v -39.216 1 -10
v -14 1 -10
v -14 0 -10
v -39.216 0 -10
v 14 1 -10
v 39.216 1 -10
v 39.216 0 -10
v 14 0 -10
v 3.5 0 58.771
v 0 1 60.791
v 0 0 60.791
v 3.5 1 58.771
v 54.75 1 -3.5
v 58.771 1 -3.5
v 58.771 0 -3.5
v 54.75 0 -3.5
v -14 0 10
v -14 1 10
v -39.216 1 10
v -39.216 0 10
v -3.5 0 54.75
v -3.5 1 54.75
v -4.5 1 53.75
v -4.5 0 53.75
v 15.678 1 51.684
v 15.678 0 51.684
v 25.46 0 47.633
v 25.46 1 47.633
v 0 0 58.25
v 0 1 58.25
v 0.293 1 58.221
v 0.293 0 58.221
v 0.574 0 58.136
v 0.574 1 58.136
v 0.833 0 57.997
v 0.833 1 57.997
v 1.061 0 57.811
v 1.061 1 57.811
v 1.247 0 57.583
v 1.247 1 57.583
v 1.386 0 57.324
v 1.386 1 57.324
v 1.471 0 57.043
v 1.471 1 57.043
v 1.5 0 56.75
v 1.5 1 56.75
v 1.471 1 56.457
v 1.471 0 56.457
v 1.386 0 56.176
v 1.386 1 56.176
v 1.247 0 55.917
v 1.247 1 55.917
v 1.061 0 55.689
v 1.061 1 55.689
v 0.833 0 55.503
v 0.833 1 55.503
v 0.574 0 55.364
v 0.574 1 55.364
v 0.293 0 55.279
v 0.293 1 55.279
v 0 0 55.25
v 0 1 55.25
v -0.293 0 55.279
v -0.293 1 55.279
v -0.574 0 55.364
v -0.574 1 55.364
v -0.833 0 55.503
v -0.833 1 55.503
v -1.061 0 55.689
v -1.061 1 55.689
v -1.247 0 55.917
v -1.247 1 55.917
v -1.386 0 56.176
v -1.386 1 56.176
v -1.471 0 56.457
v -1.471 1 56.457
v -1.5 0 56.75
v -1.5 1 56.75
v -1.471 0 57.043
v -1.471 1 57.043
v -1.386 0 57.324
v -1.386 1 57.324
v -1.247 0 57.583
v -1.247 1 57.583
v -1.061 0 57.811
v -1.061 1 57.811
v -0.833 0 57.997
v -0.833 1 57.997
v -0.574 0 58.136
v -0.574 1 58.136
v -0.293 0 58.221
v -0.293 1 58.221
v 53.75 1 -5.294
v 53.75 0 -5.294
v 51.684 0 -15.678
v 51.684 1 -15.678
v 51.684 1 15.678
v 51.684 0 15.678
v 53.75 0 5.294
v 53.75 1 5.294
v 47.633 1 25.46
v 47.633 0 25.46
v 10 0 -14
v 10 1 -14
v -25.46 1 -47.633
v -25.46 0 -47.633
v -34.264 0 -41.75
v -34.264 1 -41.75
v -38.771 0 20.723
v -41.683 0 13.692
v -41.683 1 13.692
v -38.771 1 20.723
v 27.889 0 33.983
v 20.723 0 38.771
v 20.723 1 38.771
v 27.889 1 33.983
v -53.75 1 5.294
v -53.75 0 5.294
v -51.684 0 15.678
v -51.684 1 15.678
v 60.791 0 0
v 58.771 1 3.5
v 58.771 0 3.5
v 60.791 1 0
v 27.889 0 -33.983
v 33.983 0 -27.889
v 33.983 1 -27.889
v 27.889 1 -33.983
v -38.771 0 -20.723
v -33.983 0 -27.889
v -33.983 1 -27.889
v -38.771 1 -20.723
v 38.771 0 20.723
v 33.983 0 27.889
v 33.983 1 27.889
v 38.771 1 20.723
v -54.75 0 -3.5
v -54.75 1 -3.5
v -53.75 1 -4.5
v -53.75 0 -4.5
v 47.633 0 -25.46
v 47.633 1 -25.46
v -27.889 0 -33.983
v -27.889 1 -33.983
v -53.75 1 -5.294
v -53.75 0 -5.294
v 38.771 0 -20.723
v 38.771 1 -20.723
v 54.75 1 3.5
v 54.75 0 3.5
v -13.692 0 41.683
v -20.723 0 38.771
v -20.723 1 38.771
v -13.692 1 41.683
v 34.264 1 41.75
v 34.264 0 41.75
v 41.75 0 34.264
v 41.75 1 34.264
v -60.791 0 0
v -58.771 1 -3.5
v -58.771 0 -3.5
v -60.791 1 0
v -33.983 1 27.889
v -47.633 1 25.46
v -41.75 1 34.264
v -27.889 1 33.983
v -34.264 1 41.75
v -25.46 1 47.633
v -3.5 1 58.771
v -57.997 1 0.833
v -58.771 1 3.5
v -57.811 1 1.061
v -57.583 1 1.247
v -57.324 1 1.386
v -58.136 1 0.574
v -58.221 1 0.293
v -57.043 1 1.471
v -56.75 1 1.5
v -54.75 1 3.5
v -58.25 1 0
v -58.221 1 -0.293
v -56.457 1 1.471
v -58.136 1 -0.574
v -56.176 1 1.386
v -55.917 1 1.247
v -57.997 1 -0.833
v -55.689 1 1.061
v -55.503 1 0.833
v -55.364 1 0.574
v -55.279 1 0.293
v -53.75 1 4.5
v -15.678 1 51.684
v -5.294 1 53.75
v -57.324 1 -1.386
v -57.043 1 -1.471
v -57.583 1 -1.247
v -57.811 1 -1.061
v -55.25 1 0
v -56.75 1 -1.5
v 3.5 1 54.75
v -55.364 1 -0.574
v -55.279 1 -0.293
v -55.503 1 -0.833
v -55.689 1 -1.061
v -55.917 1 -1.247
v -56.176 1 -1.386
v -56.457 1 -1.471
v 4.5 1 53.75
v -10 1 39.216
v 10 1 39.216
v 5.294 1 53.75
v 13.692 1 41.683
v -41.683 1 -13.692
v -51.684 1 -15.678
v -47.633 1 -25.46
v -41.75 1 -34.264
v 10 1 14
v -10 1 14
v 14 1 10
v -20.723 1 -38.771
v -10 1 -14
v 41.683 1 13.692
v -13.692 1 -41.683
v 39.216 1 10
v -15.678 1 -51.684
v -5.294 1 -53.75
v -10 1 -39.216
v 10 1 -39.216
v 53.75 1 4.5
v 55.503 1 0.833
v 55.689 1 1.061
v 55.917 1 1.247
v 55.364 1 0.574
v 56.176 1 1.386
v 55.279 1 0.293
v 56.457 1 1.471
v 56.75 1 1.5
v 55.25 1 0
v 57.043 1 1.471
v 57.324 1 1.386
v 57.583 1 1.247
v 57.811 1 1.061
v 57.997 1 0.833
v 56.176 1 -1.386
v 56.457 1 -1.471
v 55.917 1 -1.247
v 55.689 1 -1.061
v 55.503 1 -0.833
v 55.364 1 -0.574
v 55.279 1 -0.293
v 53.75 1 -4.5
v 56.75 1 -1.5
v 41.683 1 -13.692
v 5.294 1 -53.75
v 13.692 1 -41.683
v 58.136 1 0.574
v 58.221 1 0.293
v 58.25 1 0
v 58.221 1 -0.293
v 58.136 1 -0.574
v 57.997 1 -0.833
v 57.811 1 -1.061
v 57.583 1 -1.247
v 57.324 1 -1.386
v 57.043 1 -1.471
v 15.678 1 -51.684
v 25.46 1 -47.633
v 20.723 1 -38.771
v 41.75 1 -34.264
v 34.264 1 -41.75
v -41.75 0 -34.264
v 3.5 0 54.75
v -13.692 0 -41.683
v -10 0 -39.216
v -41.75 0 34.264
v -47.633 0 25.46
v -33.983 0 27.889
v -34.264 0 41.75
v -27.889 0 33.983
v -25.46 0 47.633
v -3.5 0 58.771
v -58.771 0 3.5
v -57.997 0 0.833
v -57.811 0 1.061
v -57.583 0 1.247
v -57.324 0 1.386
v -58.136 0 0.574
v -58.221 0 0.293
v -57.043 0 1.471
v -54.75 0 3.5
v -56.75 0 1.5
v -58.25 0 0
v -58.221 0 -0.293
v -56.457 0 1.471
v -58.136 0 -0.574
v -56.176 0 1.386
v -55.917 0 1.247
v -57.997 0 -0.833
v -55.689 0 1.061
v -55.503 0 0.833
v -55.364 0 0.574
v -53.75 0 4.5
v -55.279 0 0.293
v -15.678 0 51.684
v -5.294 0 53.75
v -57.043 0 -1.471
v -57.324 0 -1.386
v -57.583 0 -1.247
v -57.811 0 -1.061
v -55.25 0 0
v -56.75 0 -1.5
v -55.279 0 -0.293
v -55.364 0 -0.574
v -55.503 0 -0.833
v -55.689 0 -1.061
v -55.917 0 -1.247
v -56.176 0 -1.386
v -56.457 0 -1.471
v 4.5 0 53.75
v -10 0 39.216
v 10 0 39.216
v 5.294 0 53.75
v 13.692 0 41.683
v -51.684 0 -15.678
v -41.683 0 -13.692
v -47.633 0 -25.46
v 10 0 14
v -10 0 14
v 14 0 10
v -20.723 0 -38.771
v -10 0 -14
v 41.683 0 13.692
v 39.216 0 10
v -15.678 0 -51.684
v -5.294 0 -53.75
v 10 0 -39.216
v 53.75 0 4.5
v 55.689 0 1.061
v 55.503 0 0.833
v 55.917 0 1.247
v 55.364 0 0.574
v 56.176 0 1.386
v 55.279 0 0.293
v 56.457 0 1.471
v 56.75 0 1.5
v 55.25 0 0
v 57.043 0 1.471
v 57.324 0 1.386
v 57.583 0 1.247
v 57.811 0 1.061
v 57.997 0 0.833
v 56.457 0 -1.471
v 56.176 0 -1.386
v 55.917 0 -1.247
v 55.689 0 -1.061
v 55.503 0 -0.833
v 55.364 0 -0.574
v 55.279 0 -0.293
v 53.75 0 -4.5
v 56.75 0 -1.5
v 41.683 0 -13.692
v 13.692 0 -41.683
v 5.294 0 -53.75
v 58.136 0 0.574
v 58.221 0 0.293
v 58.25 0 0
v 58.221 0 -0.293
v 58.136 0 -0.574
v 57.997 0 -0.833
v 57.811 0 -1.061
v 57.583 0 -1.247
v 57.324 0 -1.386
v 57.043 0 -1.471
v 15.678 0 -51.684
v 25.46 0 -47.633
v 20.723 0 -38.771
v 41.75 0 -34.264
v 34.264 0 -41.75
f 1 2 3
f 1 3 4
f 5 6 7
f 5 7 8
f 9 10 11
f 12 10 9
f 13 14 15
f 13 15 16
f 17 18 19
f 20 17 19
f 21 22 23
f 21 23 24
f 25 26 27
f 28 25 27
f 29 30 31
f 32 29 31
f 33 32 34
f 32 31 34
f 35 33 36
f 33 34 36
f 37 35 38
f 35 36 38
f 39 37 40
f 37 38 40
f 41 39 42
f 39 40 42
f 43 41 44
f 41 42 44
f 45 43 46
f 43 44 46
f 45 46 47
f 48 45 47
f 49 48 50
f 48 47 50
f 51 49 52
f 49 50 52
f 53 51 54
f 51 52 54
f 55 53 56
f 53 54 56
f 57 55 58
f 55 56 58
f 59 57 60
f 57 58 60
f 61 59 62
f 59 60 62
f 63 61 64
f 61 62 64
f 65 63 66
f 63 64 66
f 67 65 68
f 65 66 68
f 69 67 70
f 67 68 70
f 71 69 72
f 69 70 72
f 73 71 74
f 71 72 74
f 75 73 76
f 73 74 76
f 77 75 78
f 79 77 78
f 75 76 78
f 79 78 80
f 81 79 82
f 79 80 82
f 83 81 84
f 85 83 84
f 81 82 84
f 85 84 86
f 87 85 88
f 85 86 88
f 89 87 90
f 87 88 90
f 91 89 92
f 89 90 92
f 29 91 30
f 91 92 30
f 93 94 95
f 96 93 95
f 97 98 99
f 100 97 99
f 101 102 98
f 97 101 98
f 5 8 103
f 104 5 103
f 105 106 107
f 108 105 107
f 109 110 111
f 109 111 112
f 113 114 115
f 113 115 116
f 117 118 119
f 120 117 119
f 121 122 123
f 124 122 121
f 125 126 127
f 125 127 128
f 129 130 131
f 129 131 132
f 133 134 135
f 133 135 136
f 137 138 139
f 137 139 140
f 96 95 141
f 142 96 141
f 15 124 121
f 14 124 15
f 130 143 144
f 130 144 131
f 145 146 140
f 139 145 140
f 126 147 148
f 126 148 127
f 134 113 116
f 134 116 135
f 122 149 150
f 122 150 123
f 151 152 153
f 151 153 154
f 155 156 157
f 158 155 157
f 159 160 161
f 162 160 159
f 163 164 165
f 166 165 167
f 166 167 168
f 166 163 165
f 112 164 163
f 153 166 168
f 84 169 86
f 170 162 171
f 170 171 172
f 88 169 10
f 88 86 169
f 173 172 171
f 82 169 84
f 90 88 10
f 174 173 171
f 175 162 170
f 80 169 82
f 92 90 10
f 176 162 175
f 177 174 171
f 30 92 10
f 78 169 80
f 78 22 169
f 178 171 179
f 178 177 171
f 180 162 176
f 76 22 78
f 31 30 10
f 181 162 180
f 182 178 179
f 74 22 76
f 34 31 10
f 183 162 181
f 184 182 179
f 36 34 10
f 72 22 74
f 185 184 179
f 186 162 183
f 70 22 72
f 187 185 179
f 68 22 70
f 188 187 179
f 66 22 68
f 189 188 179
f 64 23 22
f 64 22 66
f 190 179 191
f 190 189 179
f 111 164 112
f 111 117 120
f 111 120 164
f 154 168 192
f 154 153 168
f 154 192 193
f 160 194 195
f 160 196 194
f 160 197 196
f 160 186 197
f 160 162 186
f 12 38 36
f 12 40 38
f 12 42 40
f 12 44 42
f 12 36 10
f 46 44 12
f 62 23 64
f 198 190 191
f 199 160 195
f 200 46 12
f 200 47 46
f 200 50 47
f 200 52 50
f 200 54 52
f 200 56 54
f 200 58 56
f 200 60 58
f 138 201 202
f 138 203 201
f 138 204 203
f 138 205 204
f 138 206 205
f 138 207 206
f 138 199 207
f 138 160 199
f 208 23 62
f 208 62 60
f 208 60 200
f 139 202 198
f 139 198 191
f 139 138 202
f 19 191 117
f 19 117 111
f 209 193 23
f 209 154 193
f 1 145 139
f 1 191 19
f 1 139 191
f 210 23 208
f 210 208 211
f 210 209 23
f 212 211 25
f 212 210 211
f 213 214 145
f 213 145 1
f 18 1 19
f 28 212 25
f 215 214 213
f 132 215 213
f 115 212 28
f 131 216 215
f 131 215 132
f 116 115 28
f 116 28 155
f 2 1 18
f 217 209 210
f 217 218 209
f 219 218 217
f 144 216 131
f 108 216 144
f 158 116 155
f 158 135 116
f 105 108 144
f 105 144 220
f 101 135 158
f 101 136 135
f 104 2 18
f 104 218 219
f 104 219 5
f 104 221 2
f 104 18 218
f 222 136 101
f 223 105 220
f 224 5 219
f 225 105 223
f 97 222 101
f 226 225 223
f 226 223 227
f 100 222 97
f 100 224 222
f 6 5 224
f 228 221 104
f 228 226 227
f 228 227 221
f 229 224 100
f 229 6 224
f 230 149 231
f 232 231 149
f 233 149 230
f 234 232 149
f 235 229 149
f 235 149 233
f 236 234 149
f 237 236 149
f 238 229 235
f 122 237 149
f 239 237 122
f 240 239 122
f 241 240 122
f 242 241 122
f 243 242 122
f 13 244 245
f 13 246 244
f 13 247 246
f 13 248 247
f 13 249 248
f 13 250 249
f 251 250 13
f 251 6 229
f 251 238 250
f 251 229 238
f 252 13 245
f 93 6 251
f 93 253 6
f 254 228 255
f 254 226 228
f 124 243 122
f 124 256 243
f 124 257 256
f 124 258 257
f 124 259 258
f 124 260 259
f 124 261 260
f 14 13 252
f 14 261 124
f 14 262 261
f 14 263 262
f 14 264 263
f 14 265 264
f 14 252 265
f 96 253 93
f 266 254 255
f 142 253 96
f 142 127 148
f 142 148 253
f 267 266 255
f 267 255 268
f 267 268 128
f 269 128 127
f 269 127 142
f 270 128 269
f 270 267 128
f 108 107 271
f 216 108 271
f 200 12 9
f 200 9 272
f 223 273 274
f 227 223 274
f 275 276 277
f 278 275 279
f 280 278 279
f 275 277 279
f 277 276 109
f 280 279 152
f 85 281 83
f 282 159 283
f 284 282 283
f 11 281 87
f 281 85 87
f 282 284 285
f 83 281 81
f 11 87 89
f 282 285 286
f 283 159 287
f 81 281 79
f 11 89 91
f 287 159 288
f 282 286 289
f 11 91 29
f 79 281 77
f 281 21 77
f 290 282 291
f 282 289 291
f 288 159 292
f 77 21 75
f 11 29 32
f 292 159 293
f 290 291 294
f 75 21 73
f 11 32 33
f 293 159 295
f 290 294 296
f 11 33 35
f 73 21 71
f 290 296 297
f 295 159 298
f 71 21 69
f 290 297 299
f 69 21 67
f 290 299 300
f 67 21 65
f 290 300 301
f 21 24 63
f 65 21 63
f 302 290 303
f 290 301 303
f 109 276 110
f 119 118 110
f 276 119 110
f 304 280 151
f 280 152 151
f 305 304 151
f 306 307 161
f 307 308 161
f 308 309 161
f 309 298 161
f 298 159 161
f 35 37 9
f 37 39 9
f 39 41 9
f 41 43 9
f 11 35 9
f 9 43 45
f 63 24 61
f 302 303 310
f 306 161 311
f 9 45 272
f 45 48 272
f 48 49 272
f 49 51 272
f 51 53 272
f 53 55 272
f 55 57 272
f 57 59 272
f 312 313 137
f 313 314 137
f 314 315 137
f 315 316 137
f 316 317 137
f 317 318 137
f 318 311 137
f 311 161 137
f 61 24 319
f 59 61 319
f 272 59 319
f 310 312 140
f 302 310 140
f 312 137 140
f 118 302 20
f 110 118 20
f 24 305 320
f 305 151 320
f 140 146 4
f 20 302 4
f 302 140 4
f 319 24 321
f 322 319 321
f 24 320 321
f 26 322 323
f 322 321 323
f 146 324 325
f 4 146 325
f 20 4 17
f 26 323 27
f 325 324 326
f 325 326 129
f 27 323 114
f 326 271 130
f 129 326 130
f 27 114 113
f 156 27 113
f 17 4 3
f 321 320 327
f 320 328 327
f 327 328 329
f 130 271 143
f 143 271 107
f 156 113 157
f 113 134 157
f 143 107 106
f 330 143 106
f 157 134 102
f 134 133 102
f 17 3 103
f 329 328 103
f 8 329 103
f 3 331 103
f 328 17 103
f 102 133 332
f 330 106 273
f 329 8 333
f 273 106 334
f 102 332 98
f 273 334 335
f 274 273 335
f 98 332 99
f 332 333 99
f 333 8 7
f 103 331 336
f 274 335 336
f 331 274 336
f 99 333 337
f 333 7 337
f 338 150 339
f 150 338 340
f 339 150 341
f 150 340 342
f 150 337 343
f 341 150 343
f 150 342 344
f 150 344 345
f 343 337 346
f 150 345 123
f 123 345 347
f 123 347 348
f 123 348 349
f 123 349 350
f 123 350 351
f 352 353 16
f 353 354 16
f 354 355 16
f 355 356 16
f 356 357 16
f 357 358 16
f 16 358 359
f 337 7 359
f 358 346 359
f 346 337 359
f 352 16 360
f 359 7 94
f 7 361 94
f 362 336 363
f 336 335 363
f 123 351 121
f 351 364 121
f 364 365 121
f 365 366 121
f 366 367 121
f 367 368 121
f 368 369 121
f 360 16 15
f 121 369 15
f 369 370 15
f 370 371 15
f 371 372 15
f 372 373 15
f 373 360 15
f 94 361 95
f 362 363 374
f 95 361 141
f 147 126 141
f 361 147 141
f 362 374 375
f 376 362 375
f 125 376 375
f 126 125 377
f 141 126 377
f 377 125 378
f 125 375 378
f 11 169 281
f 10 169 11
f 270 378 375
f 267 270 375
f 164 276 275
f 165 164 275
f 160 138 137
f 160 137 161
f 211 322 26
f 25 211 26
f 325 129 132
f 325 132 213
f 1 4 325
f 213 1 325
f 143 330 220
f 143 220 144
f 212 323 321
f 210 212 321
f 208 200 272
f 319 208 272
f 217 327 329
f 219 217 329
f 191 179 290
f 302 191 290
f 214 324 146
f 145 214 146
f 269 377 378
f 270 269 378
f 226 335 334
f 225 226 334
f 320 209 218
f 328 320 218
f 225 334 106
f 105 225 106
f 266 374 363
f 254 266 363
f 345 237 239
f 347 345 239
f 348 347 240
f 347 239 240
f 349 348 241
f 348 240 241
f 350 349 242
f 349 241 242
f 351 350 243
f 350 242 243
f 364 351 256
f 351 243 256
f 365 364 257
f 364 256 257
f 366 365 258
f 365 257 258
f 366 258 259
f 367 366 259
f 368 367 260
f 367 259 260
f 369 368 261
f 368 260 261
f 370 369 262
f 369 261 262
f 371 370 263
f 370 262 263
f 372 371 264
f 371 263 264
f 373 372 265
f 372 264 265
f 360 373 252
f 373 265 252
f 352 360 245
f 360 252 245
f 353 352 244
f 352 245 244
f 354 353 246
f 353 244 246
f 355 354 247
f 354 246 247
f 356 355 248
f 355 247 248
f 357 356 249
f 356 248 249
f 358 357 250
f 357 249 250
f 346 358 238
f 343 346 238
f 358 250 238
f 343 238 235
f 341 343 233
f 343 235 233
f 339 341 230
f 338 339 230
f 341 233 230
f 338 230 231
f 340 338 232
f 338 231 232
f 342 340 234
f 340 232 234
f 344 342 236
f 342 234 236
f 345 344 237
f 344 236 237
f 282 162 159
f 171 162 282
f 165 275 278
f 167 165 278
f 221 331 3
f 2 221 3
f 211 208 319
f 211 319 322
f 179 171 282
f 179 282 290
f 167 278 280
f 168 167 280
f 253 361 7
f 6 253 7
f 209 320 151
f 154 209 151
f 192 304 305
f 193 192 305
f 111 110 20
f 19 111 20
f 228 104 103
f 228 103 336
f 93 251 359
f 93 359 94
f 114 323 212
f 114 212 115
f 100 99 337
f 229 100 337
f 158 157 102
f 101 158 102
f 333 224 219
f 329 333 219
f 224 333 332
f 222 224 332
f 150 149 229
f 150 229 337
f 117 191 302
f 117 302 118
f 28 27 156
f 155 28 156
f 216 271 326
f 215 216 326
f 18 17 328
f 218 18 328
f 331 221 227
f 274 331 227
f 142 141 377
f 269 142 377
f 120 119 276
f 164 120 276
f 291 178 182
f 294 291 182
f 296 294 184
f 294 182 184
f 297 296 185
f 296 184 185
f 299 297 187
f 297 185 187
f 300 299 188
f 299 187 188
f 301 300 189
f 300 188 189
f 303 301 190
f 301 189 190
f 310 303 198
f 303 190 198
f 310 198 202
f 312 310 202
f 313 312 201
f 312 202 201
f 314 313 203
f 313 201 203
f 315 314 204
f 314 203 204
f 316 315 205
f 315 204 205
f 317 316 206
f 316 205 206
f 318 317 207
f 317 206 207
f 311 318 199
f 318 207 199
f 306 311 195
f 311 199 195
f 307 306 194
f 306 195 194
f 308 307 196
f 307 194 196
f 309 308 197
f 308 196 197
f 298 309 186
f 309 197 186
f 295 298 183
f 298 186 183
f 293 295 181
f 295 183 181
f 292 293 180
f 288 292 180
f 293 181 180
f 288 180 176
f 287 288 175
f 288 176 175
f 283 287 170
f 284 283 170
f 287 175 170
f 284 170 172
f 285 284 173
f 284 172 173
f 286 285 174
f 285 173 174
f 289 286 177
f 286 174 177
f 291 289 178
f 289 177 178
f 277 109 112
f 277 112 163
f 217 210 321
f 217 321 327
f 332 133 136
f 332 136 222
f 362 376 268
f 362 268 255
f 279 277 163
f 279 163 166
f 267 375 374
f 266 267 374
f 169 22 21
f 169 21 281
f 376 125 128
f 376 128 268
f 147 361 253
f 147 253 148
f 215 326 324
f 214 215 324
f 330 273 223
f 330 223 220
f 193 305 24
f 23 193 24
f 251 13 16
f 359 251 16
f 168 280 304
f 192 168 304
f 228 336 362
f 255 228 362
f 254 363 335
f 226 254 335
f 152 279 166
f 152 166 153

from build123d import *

# Parameters (mm, degrees)
BOSS_EXTRUDE1_DEPTH = 1
SKETCH3_W           = 20
SKETCH3_H           = 87.5
BOSS_EXTRUDE4_DEPTH = 1
CIRPATTERN1_COUNT   = 2
CIRPATTERN1_ANGLE   = 90
CHAMFER1_DEPTH      = 1
SKETCH5_R           = 1.5
BOSS_EXTRUDE6_DEPTH = 1
CHAMFER3_SIZE       = 1


with BuildPart() as part:
    # Sketch1 → Boss-Extrude1 (new body)
    with BuildSketch(Plane(origin=(0, 0, 0), x_dir=(1, 0, 0), z_dir=(0, 1, 0))):
        Polygon((53.75, 5.29391293), (51.684417643, 15.678296686), (47.632632102, 25.460172293), (41.750351221, 34.263627757), (34.263627757, 41.750351221), (25.460172293, 47.632632102), (15.678296686, 51.684417643), (5.29391293, 53.75), (-5.29391293, 53.75), (-15.678296686, 51.684417643), (-25.460172293, 47.632632102), (-34.263627757, 41.750351221), (-41.750351221, 34.263627757), (-47.632632102, 25.460172293), (-51.684417643, 15.678296686), (-53.75, 5.29391293), (-53.75, -5.29391293), (-51.684417643, -15.678296686), (-47.632632102, -25.460172293), (-41.750351221, -34.263627757), (-34.263627757, -41.750351221), (-25.460172293, -47.632632102), (-15.678296686, -51.684417643), (-5.29391293, -53.75), (5.29391293, -53.75), (15.678296686, -51.684417643), (25.460172293, -47.632632102), (34.263627757, -41.750351221), (41.750351221, -34.263627757), (47.632632102, -25.460172293), (51.684417643, -15.678296686), (53.75, -5.29391293), align=None)
        Polygon((43.75, 4.308998897), (42.068712035, 12.76140428), (38.770747059, 20.723396052), (33.982844017, 27.888999337), (27.888999337, 33.982844017), (20.723396052, 38.770747059), (12.76140428, 42.068712035), (4.308998897, 43.75), (-4.308998897, 43.75), (-12.76140428, 42.068712035), (-20.723396052, 38.770747059), (-27.888999337, 33.982844017), (-33.982844017, 27.888999337), (-38.770747059, 20.723396052), (-42.068712035, 12.76140428), (-43.75, 4.308998897), (-43.75, -4.308998897), (-42.068712035, -12.76140428), (-38.770747059, -20.723396052), (-33.982844017, -27.888999337), (-27.888999337, -33.982844017), (-20.723396052, -38.770747059), (-12.76140428, -42.068712035), (-4.308998897, -43.75), (4.308998897, -43.75), (12.76140428, -42.068712035), (20.723396052, -38.770747059), (27.888999337, -33.982844017), (33.982844017, -27.888999337), (38.770747059, -20.723396052), (42.068712035, -12.76140428), (43.75, -4.308998897), align=None, mode=Mode.SUBTRACT)
    extrude(amount=BOSS_EXTRUDE1_DEPTH)

    # Sketch3 → Boss-Extrude4 (add)
    with BuildSketch(Plane(origin=(0, 1, 0), x_dir=(1, 0, 0), z_dir=(0, 1, 0))):
        Rectangle(SKETCH3_W, SKETCH3_H)
    boss_extrude4 = extrude(amount=-BOSS_EXTRUDE4_DEPTH)

    # CirPattern1: Boss-Extrude4 ×2 about axis
    cirpattern1_axis = Axis((0, 1, 0), (0, 1, 0))
    for i in range(1, CIRPATTERN1_COUNT):
        add(boss_extrude4.rotate(cirpattern1_axis, i * CIRPATTERN1_ANGLE / (CIRPATTERN1_COUNT - 1)))

    # Chamfer1: read off the stored shape, not the designer's step
    # Chamfer1 outline → Chamfer1 (add)
    with BuildSketch(Plane(origin=(0, 0, 0), x_dir=(1, 0, 0), z_dir=(0, 1, 0))):
        Polygon((10, -10), (10, -14), (14, -10), align=None)
        Polygon((13.692057296, -41.683222934), (10, -39.216269119), (10, -42.617989498), (12.76140428, -42.068712035), align=None)
        Polygon((42.617989498, -10), (39.216269119, -10), (41.683222934, -13.692057296), (42.068712035, -12.76140428), align=None)
        Polygon((-10, 10), (-10, 14), (-14, 10), align=None)
        Polygon((-13.692057296, 41.683222934), (-10, 39.216269119), (-10, 42.617989498), (-12.76140428, 42.068712035), align=None)
        Polygon((-42.617989498, 10), (-39.216269119, 10), (-41.683222934, 13.692057296), (-42.068712035, 12.76140428), align=None)
        Polygon((10, 10), (14, 10), (10, 14), align=None)
        Polygon((41.683222934, 13.692057296), (39.216269119, 10), (42.617989498, 10), (42.068712035, 12.76140428), align=None)
        Polygon((10, 42.617989498), (10, 39.216269119), (13.692057296, 41.683222934), (12.76140428, 42.068712035), align=None)
        Polygon((-10, -10), (-14, -10), (-10, -14), align=None)
        Polygon((-41.683222934, -13.692057296), (-39.216269119, -10), (-42.617989498, -10), (-42.068712035, -12.76140428), align=None)
        Polygon((-10, -42.617989498), (-10, -39.216269119), (-13.692057296, -41.683222934), (-12.76140428, -42.068712035), align=None)
    extrude(amount=CHAMFER1_DEPTH)

    # Sketch5 → Boss-Extrude6 (add)
    # profile 1 of 3: a face of its own
    with BuildSketch(Plane(origin=(0, 1, 0), x_dir=(1, 0, 0), z_dir=(0, 1, 0))):
        Polygon((-54.729274058, 3.5), (-58.770725942, 3.5), (-60.791451884, 0), (-58.770725942, -3.5), (-54.729274058, -3.5), (-53.75, -3.5), (-53.75, 3.5), align=None)
        with Locations(Location((-56.75, 0, 0), (0, 0, 270))):
            Circle(SKETCH5_R, mode=Mode.SUBTRACT)
    # profile 2 of 3: a face of its own
    with BuildSketch(Plane(origin=(0, 1, 0), x_dir=(1, 0, 0), z_dir=(0, 1, 0))):
        Polygon((54.729274058, 3.5), (53.75, 3.5), (53.75, -3.5), (54.729274058, -3.5), (58.770725942, -3.5), (60.791451884, 0), (58.770725942, 3.5), align=None)
        with Locations(Location((56.75, 0, 0), (0, 0, 270))):
            Circle(SKETCH5_R, mode=Mode.SUBTRACT)
    # profile 3 of 3: a face of its own
    with BuildSketch(Plane(origin=(0, 1, 0), x_dir=(1, 0, 0), z_dir=(0, 1, 0))):
        Polygon((3.5, -54.729274058), (3.5, -53.75), (-3.5, -53.75), (-3.5, -54.729274058), (-3.5, -58.770725942), (0, -60.791451884), (3.5, -58.770725942), align=None)
        with Locations(Location((0, -56.75, 0), (0, 0, 270))):
            Circle(SKETCH5_R, mode=Mode.SUBTRACT)
    extrude(amount=-BOSS_EXTRUDE6_DEPTH)

    # Chamfer3
    chamfer3_edges = [part.edges().sort_by_distance(p)[0] for p in [
        (-53.75, 0.5, 3.5),
        (-53.75, 0.5, -3.5),
        (53.75, 0.5, -3.5),
        (53.75, 0.5, 3.5),
        (3.5, 0.5, 53.75),
        (-3.5, 0.5, 53.75),
    ]]
    chamfer(chamfer3_edges, length=CHAMFER3_SIZE)


solid = part.part
